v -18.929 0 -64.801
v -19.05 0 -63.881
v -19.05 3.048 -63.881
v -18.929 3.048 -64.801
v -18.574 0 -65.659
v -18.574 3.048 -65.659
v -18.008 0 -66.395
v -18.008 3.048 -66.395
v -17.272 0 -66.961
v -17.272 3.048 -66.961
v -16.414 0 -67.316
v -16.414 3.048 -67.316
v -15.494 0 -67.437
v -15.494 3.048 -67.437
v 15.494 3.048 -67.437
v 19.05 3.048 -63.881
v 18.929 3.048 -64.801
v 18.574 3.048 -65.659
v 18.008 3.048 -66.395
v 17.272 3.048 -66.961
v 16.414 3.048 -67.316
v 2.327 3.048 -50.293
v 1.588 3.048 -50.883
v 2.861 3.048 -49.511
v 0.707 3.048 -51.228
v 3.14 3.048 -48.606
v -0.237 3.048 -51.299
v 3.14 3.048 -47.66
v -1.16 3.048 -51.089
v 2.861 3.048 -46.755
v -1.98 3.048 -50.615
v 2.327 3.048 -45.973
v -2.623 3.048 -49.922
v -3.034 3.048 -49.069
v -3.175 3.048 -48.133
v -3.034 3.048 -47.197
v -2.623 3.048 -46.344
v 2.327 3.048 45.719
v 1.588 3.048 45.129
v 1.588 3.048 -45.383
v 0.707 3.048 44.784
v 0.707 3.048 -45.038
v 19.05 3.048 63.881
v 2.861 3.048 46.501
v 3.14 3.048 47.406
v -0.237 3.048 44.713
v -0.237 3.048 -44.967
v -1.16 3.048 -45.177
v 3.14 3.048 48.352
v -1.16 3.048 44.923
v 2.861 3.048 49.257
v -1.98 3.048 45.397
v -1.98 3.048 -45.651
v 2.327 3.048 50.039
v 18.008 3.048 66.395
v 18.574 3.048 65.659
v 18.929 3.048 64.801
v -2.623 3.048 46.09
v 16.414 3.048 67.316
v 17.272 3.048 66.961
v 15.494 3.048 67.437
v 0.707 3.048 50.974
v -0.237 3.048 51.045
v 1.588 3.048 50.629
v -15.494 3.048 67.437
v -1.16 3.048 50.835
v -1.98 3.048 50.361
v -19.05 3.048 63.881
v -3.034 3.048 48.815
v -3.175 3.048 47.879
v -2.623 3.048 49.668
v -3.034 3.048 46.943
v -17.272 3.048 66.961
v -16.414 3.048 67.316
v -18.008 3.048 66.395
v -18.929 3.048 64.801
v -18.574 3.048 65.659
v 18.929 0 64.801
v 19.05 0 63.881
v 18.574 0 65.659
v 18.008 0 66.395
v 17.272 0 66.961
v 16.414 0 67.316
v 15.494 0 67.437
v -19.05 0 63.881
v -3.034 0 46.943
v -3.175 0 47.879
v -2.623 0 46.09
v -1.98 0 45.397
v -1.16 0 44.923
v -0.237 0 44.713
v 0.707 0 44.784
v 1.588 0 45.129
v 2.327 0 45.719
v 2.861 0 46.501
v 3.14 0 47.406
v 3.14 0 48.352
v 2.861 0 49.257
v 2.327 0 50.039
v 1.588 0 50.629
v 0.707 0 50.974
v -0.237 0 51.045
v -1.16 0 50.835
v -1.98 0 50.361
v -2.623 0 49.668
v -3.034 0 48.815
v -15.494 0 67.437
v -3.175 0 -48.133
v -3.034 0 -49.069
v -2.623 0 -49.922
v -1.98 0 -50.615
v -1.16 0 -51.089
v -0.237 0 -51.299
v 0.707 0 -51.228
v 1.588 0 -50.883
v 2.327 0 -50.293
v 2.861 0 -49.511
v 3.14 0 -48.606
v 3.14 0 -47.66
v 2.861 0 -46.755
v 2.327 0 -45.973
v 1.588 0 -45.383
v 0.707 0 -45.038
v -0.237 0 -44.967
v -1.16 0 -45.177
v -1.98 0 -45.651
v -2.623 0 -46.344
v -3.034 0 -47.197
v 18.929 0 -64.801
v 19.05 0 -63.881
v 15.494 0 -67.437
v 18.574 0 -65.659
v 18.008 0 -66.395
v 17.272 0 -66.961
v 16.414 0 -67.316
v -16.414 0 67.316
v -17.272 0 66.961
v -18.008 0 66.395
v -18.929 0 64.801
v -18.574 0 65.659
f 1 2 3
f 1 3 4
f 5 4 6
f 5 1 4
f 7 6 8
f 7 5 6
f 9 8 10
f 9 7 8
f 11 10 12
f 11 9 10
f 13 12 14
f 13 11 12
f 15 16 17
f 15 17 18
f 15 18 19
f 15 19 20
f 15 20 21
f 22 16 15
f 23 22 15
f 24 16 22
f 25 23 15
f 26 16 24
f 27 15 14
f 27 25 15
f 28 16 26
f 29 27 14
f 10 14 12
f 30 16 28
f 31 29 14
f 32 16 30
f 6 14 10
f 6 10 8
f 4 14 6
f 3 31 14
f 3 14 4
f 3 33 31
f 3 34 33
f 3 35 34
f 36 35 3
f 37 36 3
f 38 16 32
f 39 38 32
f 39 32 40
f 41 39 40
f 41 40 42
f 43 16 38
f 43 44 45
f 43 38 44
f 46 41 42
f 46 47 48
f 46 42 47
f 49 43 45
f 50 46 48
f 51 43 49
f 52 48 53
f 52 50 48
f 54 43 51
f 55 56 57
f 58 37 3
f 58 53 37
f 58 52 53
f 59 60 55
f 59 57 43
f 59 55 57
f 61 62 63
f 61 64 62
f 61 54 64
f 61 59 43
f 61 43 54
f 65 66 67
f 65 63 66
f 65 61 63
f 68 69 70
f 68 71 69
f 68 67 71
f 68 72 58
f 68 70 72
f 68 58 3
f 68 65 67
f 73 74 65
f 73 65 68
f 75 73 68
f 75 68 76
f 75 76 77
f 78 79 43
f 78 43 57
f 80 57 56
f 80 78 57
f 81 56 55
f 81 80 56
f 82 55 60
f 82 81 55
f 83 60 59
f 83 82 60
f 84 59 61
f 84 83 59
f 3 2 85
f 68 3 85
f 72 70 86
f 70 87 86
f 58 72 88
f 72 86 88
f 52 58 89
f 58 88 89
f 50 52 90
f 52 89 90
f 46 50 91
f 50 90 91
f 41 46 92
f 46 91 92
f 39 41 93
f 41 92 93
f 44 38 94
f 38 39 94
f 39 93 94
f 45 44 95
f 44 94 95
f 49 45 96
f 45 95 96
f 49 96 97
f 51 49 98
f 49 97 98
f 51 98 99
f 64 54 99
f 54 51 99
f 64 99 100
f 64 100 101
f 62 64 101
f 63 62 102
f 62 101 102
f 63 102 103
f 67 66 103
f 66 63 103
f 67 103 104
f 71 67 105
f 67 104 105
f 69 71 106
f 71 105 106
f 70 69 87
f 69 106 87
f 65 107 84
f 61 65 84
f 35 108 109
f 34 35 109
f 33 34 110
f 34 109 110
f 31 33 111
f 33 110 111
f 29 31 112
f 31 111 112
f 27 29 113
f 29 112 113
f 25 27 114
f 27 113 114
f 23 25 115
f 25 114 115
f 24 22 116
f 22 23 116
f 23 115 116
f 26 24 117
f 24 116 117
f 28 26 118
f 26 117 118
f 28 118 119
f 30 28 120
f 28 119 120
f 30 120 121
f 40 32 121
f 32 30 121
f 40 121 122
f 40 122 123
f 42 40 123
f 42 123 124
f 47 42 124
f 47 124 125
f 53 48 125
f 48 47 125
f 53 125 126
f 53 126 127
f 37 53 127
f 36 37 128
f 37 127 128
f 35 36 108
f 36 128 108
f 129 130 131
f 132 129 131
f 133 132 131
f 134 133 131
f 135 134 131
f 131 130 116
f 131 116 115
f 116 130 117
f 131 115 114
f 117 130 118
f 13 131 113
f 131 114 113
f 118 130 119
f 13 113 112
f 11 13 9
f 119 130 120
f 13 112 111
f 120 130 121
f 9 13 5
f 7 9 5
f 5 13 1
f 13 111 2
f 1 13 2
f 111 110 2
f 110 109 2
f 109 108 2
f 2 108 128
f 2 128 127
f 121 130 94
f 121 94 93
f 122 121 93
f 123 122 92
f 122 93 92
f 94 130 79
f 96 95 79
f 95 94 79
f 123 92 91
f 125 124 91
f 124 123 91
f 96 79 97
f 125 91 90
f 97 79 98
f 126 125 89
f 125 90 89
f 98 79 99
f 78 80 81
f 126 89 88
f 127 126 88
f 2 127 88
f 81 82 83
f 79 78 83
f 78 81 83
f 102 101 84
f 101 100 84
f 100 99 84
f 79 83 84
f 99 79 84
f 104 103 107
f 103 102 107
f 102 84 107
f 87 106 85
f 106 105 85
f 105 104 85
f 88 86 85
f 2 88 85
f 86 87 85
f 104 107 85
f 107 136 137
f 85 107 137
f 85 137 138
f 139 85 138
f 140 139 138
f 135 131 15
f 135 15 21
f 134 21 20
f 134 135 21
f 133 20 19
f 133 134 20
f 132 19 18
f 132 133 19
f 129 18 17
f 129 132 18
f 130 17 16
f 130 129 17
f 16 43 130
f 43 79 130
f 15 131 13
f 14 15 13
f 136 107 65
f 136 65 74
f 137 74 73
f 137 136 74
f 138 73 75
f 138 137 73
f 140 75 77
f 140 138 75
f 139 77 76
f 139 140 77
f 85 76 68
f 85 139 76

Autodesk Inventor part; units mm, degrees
ref_plane "YZ Plane" through (0, 0, 0) normal (1, 0, 0) x (0, 1, 0)
ref_plane "XZ Plane" through (0, 0, 0) normal (0, 1, 0) x (-1, 0, 0)
ref_plane "XY Plane" through (0, 0, 0) normal (0, 0, 1) x (1, 0, 0)
sketch "Sketch1" plane through (0, 0, 0) normal (0, 1, 0) x (-1, 0, 0)
  line L0 (-15.494, -67.437) -> (15.494, -67.437)
  line L1 (19.05, -63.881) -> (19.05, 63.881)
  line L2 (15.494, 67.437) -> (-15.494, 67.437)
  line L3 (-19.05, 63.881) -> (-19.05, -63.881)
  line L4 (-19.05, -67.437) -> (19.05, 67.437) construction
  line L5 (19.05, -67.437) -> (-19.05, 67.437) construction
  circle A0 centre (0, 47.879) radius 3.175
  circle A1 centre (0, -48.133) radius 3.175
  arc A2 (19.05, 63.881) -> (15.494, 67.437) centre (15.494, 63.881) ccw
  arc A3 (-15.494, 67.437) -> (-19.05, 63.881) centre (-15.494, 63.881) ccw
  arc A4 (15.494, -67.437) -> (19.05, -63.881) centre (15.494, -63.881) ccw
  arc A5 (-19.05, -63.881) -> (-15.494, -67.437) centre (-15.494, -63.881) ccw
  point P0 (0, 0)
  dimension "d0" = 38.1
  dimension "d1" = 134.874
  dimension "d2" = 6.35
  dimension "d3" = 19.558
  dimension "d4" = 6.35
  dimension "d5" = 96.012
  dimension "d6" = 3.556
extrude "Plate1" add sketch "Sketch1" along normal blind 3.048
equation "\"d7\" = Thickness"
equation "\"BendRadius\" = Thickness"
equation "\"BendReliefWidth\" = Thickness"
equation "\"BendReliefDepth\" = 0.5 * Thickness"
equation "\"CornerReliefSize\" = 4 * Thickness"
equation "\"MinimumRemnant\" = 2 * Thickness"
equation "\"TransitionRadius\" = BendRadius"
equation "\"JacobiRadiusSize\" = BendRadius"
equation "\"GapSize\" = Thickness"
equation "\"Thickness\" = 3.048"
properties part number "HOVER-plate-b"
